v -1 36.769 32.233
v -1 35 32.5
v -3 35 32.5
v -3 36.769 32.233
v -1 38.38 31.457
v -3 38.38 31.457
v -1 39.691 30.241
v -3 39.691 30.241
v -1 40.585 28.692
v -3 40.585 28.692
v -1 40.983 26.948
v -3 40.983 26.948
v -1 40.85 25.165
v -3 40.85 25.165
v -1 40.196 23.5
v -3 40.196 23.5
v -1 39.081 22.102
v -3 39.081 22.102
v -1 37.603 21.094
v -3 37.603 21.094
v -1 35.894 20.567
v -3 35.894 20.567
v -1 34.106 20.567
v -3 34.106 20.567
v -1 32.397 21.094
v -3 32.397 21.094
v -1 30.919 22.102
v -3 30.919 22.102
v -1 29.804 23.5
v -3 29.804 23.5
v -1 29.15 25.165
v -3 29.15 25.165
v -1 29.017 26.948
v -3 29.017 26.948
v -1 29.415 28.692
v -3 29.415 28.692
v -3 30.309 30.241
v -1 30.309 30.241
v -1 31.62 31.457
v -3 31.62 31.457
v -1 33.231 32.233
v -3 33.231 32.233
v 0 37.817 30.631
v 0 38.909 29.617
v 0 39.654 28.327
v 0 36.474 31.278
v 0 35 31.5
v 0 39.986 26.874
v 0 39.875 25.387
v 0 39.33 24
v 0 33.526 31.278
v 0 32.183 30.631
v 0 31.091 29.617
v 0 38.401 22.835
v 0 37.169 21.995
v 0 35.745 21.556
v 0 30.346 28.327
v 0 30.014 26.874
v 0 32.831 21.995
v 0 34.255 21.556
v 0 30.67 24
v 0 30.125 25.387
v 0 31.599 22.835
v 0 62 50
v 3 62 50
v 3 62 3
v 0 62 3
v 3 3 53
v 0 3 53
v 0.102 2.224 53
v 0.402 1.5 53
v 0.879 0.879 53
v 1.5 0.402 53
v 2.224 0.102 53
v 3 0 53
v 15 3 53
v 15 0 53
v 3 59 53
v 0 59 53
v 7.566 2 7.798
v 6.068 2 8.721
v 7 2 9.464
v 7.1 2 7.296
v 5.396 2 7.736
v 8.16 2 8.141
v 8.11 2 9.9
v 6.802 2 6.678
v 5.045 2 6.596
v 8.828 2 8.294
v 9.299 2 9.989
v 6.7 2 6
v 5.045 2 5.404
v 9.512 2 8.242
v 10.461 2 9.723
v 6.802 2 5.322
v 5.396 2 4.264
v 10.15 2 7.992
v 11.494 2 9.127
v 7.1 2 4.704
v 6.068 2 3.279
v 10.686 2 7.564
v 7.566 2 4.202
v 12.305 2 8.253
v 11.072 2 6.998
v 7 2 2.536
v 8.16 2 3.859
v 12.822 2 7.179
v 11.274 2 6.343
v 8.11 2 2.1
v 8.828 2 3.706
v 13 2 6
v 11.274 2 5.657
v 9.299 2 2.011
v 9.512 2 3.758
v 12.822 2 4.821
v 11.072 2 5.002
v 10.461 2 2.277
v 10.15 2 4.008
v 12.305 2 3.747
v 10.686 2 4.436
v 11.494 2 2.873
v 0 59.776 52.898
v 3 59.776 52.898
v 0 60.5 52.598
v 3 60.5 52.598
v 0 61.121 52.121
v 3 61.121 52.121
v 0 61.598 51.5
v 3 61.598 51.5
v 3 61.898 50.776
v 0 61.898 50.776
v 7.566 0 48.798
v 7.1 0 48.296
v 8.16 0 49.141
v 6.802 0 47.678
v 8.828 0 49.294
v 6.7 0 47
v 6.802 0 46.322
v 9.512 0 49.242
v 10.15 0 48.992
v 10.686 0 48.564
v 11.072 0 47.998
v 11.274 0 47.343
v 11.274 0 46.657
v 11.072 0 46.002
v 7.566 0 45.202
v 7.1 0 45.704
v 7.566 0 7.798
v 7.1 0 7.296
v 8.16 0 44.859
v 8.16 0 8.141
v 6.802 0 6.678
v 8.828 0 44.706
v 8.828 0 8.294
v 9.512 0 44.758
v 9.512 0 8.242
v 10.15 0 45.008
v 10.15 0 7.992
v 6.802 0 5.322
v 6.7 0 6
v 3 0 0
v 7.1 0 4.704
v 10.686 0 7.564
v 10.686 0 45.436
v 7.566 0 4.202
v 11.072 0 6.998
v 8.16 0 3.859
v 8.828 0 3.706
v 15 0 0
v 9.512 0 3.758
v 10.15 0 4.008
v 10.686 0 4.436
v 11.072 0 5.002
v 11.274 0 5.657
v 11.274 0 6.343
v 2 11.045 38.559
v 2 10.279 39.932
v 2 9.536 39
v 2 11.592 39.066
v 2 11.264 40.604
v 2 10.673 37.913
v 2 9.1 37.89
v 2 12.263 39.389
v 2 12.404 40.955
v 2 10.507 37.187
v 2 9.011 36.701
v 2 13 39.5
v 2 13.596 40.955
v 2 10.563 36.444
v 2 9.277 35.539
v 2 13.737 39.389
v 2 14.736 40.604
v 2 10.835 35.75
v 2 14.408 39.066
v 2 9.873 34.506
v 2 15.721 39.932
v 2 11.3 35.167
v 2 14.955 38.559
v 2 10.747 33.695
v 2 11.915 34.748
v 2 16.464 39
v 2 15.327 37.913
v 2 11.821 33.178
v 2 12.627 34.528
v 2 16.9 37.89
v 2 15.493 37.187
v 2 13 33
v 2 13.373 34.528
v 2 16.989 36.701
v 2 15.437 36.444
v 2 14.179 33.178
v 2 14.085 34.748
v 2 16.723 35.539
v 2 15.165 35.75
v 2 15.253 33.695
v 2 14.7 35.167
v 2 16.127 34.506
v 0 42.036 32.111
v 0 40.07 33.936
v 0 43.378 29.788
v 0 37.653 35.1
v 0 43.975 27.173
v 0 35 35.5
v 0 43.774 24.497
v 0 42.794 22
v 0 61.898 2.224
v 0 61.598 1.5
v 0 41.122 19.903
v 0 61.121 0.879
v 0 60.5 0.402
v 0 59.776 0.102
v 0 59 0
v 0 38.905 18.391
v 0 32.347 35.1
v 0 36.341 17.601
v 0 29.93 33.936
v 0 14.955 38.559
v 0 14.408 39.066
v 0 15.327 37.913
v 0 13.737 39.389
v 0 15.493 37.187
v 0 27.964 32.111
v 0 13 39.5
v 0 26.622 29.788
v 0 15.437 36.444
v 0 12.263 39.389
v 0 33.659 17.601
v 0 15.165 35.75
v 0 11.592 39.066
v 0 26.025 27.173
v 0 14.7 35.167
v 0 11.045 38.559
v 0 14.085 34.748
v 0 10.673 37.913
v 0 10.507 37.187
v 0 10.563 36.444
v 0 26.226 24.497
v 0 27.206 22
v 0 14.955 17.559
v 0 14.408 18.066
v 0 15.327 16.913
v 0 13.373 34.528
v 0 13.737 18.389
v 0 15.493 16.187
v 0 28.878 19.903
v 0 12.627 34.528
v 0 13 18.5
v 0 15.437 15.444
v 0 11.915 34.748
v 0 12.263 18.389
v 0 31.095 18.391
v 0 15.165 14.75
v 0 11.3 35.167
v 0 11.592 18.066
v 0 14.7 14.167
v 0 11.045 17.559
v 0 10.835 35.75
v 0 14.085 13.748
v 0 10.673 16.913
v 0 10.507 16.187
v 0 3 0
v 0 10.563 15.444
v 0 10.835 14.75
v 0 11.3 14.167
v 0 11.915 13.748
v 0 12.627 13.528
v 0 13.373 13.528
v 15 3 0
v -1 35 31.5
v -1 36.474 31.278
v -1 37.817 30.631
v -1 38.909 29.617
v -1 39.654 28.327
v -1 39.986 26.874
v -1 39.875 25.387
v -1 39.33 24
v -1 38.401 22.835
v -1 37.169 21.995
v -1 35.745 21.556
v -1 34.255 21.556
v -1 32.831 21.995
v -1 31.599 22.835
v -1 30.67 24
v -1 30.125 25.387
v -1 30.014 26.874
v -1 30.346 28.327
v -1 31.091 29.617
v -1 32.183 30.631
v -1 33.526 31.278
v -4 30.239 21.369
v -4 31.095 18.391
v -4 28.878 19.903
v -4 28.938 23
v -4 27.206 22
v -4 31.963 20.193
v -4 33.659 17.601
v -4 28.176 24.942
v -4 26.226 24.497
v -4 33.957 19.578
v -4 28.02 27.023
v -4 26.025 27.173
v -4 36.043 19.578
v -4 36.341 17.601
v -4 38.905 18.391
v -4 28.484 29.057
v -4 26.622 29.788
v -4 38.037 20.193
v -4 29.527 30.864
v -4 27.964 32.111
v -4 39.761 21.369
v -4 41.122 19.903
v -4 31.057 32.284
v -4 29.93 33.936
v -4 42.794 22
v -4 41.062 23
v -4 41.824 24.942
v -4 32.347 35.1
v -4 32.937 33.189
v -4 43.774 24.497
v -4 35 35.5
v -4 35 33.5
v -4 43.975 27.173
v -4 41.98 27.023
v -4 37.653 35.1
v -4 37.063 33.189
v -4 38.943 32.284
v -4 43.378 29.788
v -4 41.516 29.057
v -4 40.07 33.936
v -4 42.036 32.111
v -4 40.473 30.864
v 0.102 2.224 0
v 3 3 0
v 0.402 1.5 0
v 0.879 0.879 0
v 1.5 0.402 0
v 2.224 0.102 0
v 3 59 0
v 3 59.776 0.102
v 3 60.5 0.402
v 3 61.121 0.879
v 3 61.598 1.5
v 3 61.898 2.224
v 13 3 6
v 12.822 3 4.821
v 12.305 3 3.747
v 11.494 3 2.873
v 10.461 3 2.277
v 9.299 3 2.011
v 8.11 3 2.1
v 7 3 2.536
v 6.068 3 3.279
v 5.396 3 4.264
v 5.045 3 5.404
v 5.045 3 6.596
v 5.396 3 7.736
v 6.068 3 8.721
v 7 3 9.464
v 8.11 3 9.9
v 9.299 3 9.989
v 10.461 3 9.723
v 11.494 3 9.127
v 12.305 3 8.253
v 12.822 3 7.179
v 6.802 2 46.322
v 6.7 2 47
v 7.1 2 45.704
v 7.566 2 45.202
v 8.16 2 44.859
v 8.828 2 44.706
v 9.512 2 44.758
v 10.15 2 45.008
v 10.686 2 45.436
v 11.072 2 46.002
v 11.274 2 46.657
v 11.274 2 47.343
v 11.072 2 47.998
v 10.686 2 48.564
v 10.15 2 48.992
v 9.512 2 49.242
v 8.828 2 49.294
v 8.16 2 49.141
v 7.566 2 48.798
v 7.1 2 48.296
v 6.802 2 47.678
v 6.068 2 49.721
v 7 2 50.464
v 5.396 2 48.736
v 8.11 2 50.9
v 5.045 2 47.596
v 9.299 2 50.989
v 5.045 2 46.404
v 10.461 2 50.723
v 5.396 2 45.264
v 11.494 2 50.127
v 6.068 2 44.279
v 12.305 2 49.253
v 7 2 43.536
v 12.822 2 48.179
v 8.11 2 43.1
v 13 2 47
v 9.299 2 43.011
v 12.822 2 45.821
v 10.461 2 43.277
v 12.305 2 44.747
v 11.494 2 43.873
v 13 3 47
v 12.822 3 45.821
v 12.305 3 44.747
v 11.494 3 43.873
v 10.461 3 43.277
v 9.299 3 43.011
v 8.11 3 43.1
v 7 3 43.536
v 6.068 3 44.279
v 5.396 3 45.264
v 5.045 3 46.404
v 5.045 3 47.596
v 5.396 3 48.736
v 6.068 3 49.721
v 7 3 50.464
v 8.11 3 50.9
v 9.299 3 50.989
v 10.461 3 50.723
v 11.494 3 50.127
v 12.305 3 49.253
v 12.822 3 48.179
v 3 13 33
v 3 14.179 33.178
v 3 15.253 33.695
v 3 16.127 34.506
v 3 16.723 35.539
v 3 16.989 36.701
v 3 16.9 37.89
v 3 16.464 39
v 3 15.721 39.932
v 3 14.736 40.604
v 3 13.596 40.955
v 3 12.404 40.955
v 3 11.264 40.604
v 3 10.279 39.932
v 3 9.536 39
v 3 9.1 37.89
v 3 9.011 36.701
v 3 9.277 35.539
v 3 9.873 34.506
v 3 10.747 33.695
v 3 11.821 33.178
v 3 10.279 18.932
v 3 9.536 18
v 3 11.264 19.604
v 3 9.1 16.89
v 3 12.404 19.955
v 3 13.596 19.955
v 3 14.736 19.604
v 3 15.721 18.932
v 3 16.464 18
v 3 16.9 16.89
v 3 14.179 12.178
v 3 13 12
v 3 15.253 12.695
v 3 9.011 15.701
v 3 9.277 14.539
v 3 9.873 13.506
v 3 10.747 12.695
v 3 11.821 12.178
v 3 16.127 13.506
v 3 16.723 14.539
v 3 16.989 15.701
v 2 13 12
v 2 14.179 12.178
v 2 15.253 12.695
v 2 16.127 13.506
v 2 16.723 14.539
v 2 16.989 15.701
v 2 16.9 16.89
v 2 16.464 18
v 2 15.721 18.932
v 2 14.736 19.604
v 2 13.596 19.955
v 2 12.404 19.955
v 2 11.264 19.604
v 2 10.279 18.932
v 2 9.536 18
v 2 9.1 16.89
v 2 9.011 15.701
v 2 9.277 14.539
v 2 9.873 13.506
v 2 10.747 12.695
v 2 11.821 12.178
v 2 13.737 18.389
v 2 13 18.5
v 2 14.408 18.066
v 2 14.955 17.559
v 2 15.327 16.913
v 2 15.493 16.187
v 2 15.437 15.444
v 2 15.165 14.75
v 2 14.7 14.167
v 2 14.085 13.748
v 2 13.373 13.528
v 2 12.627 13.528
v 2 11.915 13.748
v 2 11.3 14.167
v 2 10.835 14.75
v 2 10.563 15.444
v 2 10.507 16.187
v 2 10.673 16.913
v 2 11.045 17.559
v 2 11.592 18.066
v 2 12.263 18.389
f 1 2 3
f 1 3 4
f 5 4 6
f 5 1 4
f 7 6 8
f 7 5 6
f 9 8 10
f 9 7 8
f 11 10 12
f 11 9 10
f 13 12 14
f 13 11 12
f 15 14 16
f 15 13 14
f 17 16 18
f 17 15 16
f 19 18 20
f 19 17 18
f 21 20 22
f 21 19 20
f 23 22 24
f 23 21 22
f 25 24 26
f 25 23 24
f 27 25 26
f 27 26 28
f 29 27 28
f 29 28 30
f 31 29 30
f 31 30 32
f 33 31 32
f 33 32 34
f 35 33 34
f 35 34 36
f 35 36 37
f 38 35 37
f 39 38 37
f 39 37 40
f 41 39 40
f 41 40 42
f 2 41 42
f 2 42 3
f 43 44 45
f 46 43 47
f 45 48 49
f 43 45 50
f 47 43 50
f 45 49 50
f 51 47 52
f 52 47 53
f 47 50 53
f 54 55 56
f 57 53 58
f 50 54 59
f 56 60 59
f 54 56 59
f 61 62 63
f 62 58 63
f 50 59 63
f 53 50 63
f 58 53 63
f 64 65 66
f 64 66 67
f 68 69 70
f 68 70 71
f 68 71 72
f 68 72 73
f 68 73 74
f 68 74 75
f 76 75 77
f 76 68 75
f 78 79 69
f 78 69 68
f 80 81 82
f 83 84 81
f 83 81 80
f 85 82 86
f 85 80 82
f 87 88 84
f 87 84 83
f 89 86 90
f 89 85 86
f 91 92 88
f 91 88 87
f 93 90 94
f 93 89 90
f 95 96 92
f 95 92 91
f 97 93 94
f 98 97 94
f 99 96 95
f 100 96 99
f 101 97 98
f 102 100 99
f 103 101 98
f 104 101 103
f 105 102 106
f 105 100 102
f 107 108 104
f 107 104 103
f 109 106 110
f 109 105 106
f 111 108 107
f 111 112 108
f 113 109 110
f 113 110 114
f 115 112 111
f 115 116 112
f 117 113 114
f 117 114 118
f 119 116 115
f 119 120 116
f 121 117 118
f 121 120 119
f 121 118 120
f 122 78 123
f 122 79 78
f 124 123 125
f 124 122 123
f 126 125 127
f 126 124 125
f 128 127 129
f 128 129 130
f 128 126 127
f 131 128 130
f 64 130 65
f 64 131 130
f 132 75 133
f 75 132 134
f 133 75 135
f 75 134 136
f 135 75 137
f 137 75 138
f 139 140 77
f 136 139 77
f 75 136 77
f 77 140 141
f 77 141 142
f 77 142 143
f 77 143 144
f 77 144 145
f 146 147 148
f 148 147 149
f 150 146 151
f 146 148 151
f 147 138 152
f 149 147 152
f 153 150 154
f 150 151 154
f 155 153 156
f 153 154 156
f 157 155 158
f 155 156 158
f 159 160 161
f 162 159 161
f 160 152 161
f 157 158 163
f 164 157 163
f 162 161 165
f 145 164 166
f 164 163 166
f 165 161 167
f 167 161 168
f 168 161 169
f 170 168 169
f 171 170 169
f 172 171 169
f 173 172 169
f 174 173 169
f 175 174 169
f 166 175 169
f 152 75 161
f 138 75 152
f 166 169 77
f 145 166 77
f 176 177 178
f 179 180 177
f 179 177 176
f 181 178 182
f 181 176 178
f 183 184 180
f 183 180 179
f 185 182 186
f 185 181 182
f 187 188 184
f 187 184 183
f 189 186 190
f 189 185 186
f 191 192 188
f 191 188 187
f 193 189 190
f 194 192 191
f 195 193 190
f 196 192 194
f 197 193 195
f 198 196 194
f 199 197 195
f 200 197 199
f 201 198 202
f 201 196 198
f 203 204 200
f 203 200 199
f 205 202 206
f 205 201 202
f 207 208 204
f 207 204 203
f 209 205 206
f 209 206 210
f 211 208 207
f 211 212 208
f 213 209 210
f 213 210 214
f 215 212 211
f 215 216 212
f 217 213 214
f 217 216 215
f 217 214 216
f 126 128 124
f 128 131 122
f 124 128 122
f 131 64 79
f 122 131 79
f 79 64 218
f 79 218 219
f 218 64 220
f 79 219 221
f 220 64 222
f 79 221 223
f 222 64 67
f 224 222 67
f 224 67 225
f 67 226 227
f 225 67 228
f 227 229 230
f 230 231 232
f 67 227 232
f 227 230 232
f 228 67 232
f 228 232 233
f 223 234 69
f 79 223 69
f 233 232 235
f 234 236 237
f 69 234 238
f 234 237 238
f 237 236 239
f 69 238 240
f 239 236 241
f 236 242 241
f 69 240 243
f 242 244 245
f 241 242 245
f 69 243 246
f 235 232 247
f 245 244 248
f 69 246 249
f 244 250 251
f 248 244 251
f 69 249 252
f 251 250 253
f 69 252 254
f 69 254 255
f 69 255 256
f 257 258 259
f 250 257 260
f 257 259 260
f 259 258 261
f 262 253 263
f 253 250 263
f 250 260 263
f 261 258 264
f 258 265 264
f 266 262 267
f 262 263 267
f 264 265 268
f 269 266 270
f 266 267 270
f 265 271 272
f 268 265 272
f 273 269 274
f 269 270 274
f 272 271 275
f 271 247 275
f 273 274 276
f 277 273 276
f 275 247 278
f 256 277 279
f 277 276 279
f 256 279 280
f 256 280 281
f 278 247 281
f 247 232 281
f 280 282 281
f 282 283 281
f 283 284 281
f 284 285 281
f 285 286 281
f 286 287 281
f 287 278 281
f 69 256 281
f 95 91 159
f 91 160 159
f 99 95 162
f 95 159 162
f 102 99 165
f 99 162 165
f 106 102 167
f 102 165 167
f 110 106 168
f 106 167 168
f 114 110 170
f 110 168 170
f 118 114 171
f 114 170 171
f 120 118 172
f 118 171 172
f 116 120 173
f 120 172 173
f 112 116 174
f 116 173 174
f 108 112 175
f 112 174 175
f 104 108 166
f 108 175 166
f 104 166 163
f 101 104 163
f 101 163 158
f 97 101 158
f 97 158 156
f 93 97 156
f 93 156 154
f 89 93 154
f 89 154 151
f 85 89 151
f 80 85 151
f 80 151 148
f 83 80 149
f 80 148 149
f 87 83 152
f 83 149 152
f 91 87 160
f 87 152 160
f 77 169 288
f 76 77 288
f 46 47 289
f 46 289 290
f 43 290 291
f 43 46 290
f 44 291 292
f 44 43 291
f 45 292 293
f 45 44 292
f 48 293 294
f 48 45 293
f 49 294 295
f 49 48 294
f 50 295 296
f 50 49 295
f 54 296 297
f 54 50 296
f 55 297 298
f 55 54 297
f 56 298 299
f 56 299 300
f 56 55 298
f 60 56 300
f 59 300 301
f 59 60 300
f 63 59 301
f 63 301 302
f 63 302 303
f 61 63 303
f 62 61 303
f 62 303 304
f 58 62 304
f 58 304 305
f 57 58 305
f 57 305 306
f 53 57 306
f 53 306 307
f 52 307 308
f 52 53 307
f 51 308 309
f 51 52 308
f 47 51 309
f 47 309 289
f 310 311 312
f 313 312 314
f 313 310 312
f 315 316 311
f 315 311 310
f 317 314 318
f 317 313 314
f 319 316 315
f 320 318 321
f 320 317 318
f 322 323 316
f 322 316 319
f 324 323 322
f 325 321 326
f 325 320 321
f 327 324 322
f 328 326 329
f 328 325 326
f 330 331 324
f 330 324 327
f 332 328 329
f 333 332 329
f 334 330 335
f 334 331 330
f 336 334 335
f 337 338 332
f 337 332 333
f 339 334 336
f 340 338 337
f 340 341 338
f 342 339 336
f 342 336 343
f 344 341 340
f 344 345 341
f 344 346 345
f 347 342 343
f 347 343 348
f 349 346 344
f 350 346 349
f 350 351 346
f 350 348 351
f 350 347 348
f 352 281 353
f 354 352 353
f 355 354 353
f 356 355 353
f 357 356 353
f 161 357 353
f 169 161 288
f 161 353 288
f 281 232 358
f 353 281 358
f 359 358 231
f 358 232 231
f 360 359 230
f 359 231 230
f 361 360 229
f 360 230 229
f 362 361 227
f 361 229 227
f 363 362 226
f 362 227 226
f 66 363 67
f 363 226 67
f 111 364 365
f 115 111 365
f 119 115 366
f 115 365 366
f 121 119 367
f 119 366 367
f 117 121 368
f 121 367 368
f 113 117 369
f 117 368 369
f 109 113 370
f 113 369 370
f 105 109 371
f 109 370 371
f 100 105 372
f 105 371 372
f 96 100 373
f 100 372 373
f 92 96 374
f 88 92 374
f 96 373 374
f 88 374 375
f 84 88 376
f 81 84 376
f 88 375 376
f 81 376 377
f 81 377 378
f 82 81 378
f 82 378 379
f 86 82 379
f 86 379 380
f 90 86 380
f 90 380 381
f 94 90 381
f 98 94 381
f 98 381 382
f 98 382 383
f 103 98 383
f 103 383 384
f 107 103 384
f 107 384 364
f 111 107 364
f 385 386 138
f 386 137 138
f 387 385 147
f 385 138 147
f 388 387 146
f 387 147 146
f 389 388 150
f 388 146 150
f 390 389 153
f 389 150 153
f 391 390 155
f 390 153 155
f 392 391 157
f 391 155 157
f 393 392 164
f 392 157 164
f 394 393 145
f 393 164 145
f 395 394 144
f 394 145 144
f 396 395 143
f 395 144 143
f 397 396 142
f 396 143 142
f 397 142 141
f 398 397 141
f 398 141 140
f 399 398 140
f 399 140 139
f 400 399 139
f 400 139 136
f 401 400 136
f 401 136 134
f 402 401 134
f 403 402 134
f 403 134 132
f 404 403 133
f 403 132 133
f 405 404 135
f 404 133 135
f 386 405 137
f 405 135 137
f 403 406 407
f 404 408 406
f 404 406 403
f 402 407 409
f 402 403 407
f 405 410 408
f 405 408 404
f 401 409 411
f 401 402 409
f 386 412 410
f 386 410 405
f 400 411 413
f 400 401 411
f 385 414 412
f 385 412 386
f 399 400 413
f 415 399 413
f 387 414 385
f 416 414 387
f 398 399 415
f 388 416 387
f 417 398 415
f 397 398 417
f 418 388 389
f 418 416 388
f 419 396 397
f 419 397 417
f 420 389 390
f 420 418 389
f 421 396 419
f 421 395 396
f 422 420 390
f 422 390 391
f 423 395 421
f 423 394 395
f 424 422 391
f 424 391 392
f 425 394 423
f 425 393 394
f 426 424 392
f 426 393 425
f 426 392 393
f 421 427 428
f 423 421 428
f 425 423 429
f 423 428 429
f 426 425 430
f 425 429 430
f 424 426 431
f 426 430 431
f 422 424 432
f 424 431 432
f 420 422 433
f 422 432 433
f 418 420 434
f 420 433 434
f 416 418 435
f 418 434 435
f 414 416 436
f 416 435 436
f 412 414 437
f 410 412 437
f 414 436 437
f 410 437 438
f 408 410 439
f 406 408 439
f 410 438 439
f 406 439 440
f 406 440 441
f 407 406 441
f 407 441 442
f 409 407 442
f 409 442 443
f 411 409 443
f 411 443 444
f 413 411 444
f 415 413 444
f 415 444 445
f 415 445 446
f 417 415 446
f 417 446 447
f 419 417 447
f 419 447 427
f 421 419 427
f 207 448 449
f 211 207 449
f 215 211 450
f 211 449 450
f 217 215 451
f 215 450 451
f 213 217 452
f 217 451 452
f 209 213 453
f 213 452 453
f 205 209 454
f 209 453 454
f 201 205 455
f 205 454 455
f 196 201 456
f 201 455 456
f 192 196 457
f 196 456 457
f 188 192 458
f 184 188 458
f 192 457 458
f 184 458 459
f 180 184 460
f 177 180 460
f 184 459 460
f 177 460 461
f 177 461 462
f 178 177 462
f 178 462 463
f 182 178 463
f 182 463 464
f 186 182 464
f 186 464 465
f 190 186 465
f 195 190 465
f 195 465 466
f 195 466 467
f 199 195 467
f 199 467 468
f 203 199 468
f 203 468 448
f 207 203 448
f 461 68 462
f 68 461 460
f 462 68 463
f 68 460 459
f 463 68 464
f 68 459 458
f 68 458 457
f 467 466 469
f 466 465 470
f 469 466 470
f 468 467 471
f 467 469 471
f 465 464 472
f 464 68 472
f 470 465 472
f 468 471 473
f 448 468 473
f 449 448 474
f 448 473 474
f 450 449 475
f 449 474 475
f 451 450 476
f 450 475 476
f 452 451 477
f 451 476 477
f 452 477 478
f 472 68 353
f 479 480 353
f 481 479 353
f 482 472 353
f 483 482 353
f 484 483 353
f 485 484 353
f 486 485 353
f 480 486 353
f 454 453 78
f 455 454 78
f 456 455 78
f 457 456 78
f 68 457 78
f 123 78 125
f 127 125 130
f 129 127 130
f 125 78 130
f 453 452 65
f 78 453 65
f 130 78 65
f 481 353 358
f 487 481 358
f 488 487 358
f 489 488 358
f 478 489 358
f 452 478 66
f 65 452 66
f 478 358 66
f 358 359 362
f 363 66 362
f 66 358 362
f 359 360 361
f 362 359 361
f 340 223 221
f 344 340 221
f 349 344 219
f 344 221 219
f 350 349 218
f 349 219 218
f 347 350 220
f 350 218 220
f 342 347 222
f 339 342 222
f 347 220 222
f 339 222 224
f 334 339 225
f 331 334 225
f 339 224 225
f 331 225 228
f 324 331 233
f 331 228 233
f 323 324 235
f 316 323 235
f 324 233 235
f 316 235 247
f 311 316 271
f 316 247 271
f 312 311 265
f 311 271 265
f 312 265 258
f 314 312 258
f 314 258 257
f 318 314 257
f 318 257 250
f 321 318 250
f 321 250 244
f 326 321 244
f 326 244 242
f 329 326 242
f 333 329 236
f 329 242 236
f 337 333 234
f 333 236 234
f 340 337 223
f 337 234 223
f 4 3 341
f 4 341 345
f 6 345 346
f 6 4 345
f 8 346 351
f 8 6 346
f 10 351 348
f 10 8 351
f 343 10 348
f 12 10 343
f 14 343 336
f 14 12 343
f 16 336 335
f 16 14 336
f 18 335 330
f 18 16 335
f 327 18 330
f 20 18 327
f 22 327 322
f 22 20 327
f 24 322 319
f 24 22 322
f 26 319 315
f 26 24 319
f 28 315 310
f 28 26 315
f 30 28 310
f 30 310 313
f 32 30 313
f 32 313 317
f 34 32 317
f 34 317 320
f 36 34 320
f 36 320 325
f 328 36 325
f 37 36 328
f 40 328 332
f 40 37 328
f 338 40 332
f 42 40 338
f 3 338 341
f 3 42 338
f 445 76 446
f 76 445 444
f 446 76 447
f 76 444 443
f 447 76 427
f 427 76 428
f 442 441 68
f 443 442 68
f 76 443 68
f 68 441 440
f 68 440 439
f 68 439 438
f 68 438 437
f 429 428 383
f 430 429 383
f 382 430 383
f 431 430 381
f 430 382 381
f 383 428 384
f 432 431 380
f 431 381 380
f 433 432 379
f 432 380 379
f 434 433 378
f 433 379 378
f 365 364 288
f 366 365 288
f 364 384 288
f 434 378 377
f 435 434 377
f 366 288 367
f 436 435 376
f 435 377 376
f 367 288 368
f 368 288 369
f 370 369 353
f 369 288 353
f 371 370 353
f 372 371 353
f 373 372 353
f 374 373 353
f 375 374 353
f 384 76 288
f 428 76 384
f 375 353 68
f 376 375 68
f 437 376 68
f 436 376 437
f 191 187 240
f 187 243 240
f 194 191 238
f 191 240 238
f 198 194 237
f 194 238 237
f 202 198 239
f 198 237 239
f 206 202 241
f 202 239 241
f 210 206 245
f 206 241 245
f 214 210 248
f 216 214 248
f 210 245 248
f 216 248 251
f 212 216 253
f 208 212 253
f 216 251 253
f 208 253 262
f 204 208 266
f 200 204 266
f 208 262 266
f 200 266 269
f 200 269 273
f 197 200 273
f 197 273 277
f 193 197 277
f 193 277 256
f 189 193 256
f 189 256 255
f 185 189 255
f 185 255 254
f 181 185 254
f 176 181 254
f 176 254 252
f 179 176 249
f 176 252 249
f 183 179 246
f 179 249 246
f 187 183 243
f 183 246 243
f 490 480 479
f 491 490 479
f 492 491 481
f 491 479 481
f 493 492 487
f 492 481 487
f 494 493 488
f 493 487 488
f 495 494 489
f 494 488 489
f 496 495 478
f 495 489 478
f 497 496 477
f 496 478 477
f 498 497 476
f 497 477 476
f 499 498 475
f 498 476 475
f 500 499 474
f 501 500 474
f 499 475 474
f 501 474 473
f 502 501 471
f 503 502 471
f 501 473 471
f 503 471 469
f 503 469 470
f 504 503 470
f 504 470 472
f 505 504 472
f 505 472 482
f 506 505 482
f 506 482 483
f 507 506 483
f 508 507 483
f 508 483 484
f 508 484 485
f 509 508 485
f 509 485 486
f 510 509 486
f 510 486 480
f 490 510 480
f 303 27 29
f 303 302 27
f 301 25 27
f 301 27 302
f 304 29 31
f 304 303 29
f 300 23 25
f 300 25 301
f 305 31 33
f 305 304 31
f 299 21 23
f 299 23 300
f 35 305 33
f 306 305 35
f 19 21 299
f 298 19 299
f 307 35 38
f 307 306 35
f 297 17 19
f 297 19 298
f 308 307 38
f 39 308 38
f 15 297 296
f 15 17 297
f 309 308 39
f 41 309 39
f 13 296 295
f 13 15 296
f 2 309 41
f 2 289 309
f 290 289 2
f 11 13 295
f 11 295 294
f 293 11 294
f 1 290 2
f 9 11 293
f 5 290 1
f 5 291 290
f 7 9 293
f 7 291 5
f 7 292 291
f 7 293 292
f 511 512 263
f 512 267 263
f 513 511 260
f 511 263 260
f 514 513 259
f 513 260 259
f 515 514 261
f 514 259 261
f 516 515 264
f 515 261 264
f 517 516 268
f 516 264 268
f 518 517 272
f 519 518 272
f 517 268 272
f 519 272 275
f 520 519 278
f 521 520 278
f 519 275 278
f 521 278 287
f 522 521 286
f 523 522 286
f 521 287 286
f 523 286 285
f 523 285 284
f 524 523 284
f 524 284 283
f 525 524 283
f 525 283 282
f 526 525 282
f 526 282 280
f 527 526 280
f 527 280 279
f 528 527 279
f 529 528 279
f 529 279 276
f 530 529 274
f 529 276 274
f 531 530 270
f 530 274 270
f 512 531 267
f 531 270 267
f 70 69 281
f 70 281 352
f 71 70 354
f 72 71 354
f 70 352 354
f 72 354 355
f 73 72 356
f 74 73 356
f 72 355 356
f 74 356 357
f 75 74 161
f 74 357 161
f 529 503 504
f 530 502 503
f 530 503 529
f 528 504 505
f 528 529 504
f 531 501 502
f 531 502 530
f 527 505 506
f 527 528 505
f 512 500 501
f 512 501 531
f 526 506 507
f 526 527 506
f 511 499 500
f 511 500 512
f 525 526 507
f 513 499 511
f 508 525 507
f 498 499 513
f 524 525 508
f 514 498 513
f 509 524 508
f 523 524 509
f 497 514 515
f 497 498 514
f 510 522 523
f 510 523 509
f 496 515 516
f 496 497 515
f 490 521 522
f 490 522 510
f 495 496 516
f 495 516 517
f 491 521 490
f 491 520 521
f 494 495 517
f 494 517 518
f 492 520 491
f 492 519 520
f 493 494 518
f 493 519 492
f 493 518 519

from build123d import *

# Parameters (mm, degrees)
SM_BASE_FLANGE_1_DEPTH    = 53
SKETCH_7_R                = 9
SKETCH_7_R_2              = 6
EXTRUDE_1_DEPTH           = 4
SKETCH_8_R                = 6
SKETCH_8_R_2              = 5
EXTRUDE_2_DEPTH           = 1
HOLE_WIZARD_1_D           = 4.6
HOLE_WIZARD_1_CBORE_D     = 8
HOLE_WIZARD_1_CBORE_DEPTH = 1
HOLE_WIZARD_2_D           = 5
HOLE_WIZARD_2_DEPTH       = 3
HOLE_WIZARD_2_CBORE_D     = 8
HOLE_WIZARD_2_CBORE_DEPTH = 1
HOLE_WIZARD_2_TIP         = 1.502151548
FILLET_1_R                = 3
CHAMFER_1_SIZE            = 1


# Read off the part's stored shape, not the designer's step: 基体-法兰1
with BuildPart() as part:
    # 基体-法兰1 outline → 基体-法兰1 (new body)
    with BuildSketch(Plane.XY):
        with BuildLine():
            Line((3, 3), (3, 62))
            Line((3, 62), (0, 62))
            Line((0, 62), (0, 3))
            ThreePointArc((0, 3), (0.878679656, 0.878679656), (3, 0))
            Line((3, 0), (15, 0))
            Line((15, 0), (15, 3))
            Line((15, 3), (3, 3))
        make_face()
    extrude(amount=SM_BASE_FLANGE_1_DEPTH)

    # 草图7 → 凸台-拉伸1 (add)
    with BuildSketch(Plane.ZY):
        with Locations((26.5, 35)):
            Circle(SKETCH_7_R)
        with Locations((26.5, 35)):
            Circle(SKETCH_7_R_2, mode=Mode.SUBTRACT)
    extrude(amount=EXTRUDE_1_DEPTH)

    # 草图8 → 凸台-拉伸2 (add)
    with BuildSketch(Plane.ZY):
        with Locations((26.5, 35)):
            Circle(SKETCH_8_R)
        with Locations((26.5, 35)):
            Circle(SKETCH_8_R_2, mode=Mode.SUBTRACT)
    extrude(amount=EXTRUDE_2_DEPTH)

    # 打孔尺寸(%根据)内六角圆柱头螺钉的类型1 (through all)
    with Locations(Plane(origin=(0, 3, 0), x_dir=(1, 0, 0), z_dir=(0, 1, 0))):
        with Locations((9, -6), (9, -47)):
            CounterBoreHole(HOLE_WIZARD_1_D / 2, HOLE_WIZARD_1_CBORE_D / 2, HOLE_WIZARD_1_CBORE_DEPTH)

    # 打孔尺寸(%根据)内六角圆柱头螺钉的类型2
    with Locations(Plane(origin=(3, 0, 0), x_dir=(0, 0, -1), z_dir=(1, 0, 0))):
        with Locations((-37, 13), (-16, 13)):
            CounterBoreHole(HOLE_WIZARD_2_D / 2, HOLE_WIZARD_2_CBORE_D / 2, HOLE_WIZARD_2_CBORE_DEPTH, depth=HOLE_WIZARD_2_DEPTH)
            with Locations((0, 0, -(HOLE_WIZARD_2_DEPTH + HOLE_WIZARD_2_TIP / 2))):  # 118° drill point
                Cone(0, HOLE_WIZARD_2_D / 2, HOLE_WIZARD_2_TIP, mode=Mode.SUBTRACT)

    # 圆角1
    fillet_1_edges = [part.edges().sort_by_distance(p)[0] for p in [
        (1.5, 62, 0),
        (1.5, 62, 53),
    ]]
    fillet(fillet_1_edges, radius=FILLET_1_R)

    # 倒角1
    chamfer_1_edges = [part.edges().sort_by_distance(p)[0] for p in [
        (-4, 35, 20.5),
    ]]
    chamfer(chamfer_1_edges, length=CHAMFER_1_SIZE)


solid = part.part
